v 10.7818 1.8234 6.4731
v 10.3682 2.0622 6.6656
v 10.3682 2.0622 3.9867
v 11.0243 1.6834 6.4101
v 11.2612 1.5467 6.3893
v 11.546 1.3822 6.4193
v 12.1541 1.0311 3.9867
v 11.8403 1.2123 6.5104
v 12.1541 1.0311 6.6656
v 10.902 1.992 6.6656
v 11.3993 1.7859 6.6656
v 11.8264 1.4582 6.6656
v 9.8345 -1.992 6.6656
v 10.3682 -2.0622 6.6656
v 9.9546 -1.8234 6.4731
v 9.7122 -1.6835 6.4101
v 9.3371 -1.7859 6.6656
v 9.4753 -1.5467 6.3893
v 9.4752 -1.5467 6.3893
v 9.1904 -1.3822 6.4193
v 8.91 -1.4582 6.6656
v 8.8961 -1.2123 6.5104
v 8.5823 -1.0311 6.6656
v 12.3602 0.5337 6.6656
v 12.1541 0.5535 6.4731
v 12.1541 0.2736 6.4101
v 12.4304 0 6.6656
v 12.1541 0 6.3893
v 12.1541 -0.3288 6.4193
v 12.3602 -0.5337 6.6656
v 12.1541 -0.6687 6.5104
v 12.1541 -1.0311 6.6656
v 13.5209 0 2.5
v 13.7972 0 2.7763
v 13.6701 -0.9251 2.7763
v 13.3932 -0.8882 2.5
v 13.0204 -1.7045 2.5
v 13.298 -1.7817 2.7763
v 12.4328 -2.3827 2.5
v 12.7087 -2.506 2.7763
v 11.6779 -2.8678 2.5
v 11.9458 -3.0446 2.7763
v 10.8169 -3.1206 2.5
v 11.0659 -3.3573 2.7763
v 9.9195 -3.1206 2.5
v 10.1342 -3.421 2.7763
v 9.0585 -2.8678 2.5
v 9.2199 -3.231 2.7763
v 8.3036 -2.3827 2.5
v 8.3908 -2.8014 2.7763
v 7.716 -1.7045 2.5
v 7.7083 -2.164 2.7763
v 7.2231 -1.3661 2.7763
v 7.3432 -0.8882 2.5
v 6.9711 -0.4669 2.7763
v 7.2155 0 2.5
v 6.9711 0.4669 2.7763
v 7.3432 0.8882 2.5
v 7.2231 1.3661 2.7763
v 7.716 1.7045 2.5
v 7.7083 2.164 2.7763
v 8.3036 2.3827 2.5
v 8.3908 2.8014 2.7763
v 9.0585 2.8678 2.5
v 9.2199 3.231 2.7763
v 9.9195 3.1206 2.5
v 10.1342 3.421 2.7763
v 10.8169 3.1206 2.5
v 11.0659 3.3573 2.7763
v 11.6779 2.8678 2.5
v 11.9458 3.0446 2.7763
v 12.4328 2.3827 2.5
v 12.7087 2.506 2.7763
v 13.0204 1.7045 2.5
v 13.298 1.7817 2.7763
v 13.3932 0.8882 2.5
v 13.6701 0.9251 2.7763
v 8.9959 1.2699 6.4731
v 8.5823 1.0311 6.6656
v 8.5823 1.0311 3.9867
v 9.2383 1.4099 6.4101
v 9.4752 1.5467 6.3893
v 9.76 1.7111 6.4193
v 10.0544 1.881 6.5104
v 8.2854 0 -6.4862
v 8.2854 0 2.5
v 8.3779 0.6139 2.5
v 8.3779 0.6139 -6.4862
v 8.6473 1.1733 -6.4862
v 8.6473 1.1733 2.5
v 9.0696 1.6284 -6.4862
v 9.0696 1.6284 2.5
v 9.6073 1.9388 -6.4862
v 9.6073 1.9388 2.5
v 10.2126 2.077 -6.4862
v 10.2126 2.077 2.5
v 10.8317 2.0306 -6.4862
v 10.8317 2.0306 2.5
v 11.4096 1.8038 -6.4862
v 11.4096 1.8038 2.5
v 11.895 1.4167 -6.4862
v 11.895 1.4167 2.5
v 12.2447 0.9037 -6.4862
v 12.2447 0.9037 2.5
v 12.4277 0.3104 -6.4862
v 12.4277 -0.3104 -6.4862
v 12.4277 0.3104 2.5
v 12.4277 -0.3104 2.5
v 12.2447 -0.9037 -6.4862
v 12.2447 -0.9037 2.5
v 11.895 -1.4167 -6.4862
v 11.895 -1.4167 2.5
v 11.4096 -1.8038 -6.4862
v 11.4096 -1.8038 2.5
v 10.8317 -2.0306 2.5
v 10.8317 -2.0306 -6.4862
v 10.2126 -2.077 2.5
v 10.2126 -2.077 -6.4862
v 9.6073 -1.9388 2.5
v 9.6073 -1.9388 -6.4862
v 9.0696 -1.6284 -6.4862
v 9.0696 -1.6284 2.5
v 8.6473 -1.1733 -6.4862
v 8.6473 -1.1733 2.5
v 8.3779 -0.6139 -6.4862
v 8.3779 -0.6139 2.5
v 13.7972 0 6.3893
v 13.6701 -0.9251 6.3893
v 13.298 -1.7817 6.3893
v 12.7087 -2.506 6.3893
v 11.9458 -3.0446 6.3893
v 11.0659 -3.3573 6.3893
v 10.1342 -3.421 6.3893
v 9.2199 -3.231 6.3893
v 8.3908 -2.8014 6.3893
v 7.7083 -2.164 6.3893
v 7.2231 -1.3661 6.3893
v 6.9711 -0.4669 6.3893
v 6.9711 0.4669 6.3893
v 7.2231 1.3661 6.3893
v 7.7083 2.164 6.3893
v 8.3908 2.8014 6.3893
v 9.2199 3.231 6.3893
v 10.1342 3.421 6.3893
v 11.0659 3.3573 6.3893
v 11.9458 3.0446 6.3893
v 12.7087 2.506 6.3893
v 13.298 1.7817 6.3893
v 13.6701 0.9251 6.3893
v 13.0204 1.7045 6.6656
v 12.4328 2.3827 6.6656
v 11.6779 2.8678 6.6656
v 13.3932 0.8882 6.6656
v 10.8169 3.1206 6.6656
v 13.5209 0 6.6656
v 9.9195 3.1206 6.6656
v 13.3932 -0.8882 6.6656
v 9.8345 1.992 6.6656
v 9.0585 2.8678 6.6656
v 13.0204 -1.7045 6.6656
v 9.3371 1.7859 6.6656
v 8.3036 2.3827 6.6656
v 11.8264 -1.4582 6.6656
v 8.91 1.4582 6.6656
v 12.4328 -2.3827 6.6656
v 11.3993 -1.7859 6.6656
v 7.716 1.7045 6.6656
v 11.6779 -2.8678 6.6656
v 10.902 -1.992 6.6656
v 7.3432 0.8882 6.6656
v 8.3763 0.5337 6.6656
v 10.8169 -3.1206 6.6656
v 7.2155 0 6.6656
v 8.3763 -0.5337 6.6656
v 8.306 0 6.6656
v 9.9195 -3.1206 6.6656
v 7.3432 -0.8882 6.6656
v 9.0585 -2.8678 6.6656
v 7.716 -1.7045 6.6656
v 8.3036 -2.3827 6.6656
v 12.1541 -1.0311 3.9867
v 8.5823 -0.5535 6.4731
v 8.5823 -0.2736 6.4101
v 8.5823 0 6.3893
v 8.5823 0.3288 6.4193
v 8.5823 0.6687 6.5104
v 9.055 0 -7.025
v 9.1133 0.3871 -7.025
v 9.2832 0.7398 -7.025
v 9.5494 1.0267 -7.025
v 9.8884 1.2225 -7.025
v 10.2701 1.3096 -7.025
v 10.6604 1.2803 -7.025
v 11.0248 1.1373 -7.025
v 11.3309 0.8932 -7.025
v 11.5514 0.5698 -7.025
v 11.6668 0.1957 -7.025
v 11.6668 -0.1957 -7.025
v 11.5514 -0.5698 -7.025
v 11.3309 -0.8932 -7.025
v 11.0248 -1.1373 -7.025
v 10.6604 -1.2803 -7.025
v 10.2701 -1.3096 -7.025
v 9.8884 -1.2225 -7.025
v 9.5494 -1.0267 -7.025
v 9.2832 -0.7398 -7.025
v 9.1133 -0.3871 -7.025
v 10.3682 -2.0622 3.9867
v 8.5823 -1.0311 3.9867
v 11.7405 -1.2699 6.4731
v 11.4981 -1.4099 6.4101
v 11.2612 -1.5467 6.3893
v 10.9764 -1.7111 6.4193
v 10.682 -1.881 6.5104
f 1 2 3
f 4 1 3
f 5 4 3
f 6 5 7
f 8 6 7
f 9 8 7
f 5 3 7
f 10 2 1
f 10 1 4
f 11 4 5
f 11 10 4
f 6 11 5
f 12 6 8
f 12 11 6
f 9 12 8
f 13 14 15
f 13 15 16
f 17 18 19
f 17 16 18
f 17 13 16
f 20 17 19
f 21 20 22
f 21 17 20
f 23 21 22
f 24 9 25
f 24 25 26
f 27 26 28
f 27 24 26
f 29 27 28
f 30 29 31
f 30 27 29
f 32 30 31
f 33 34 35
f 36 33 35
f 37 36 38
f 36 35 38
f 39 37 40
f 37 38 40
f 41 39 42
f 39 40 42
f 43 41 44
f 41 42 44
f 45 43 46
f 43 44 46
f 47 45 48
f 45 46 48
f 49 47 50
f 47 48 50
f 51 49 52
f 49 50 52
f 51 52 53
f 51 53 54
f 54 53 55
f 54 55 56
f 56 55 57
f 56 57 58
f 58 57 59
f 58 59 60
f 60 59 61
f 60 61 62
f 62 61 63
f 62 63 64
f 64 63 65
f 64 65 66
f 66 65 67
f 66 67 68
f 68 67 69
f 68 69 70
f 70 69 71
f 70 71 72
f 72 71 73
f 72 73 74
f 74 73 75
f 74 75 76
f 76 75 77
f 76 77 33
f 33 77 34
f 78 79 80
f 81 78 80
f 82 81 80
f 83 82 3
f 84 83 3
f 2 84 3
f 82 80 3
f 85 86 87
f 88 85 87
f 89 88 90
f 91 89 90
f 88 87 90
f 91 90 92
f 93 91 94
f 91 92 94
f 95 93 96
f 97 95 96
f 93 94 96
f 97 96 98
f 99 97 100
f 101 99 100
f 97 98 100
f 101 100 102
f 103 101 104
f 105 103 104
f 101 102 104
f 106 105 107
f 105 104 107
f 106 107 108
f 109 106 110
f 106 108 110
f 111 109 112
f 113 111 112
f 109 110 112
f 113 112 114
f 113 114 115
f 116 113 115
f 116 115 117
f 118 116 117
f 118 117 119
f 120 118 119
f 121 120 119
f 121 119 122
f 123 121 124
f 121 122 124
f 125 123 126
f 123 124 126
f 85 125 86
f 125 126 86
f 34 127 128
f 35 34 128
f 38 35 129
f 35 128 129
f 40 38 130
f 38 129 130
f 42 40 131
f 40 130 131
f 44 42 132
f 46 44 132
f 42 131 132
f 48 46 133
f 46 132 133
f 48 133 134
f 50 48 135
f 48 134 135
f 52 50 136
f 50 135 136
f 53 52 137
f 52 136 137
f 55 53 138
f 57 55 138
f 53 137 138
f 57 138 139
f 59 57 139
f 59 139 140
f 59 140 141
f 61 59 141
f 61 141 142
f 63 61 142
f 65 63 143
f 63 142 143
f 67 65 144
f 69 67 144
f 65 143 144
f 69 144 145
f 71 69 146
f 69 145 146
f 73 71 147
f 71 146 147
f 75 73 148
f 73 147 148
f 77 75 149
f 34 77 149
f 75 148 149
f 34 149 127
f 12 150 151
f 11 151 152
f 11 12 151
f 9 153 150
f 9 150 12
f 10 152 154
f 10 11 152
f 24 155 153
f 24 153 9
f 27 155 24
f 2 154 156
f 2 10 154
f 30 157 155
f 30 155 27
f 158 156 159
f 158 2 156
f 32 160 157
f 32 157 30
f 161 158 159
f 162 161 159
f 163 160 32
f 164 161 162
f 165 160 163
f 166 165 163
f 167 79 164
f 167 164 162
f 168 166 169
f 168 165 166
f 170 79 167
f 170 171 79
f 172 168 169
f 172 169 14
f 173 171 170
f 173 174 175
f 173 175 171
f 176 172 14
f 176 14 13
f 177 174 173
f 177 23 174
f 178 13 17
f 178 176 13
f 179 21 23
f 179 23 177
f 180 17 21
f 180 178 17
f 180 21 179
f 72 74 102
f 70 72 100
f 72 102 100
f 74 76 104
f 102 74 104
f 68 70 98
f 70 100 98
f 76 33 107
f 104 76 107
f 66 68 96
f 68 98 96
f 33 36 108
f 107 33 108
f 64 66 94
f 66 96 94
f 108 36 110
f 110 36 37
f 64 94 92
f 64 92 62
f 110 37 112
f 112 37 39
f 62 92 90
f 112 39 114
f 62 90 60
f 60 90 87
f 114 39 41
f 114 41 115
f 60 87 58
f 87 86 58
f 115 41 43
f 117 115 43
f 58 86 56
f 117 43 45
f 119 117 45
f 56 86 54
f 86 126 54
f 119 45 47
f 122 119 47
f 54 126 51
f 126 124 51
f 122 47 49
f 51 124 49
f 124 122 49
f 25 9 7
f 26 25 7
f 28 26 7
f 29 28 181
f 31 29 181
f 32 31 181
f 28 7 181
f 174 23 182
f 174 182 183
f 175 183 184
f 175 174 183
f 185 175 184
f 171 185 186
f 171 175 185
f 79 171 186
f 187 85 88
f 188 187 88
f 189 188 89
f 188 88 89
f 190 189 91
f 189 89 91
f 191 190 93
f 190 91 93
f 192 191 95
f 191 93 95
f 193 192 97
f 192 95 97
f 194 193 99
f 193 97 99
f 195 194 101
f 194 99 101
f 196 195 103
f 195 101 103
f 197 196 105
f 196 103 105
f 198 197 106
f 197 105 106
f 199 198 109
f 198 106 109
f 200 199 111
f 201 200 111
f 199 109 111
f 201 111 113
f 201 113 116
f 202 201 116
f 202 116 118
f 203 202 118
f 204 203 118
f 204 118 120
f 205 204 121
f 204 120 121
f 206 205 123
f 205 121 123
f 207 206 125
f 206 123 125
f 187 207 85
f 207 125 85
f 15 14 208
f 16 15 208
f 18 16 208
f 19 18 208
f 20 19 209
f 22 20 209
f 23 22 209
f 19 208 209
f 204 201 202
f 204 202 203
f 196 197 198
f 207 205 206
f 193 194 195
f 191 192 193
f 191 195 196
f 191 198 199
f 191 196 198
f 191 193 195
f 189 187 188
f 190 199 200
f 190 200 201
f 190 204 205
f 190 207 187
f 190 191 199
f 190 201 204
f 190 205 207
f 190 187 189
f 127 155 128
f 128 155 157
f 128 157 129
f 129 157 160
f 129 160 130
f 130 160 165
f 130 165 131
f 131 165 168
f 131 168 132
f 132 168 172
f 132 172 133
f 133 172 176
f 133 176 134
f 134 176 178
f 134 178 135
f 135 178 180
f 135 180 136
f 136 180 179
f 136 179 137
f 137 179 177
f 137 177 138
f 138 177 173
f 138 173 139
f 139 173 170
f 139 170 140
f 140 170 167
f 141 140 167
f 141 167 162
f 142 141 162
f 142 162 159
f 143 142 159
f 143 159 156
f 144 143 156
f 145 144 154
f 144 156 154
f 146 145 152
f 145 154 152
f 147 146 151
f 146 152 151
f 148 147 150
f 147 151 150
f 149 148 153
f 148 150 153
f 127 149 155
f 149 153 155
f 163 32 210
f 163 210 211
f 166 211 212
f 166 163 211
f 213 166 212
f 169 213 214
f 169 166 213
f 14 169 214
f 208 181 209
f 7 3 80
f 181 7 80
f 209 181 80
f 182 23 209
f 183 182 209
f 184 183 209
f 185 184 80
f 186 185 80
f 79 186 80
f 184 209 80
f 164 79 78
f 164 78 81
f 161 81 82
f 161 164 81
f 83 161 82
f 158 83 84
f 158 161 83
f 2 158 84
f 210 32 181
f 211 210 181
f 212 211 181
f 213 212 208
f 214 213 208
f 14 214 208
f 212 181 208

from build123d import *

# Parameters (mm, degrees)
SKETCH1_W           = 3.429
SKETCH1_H           = 4.1656
SKETCH2_R           = 2.0828
BOSS_EXTRUDE1_DEPTH = 9.525
CUT_EXTRUDE1_DEPTH  = 2.678906
CHAMFER1_SIZE       = 0.27628549
CHAMFER2_SIZE       = 0.769555748
CHAMFER2_SIZE2      = 0.538848736


with BuildPart() as part:
    # Sketch1 → Revolve1 (revolve)
    with BuildSketch(Plane.XZ):
        with Locations((12.082710259, 4.5828)):
            Rectangle(SKETCH1_W, SKETCH1_H)
    revolve(axis=Axis((10.368210259, 0, 6.6656), (0, 0, -1)))

    # Sketch2 → Boss-Extrude1 (add)
    with BuildSketch(Plane(origin=(0, 0, 2.5), x_dir=(-1, 0, 0), z_dir=(0, 0, -1))):
        with Locations((-10.368210259, 0)):
            Circle(SKETCH2_R)
    extrude(amount=BOSS_EXTRUDE1_DEPTH)

    # Sketch3 → Cut-Extrude1 (cut)
    with BuildSketch(Plane(origin=(0, 0, 3.98669375), x_dir=(-1, 0, 0), z_dir=(0, 0, -1))):
        Polygon((-10.368210259, -2.062222993), (-8.582272759, -1.031111496), (-8.582272759, 1.031111496), (-10.368210259, 2.062222993), (-12.154147759, 1.031111496), (-12.154147759, -1.031111496), align=None)
    extrude(amount=-CUT_EXTRUDE1_DEPTH, mode=Mode.SUBTRACT)

    # Chamfer1
    chamfer1_edges = [part.edges().sort_by_distance(p)[0] for p in [
        (6.939210259, 0, 2.5),
        (6.939210259, 0, 6.6656),
    ]]
    chamfer(chamfer1_edges, length=CHAMFER1_SIZE)

    # Chamfer2
    chamfer2_edges = [part.edges().sort_by_distance(p)[0] for p in [
        (12.451010259, 0, -7.025),
    ]]
    chamfer2_side = [part.faces().sort_by_distance(p)[0] for p in [
        (10.368210259, 0, -7.025),
    ]]
    chamfer(chamfer2_edges, length=CHAMFER2_SIZE, length2=CHAMFER2_SIZE2, reference=chamfer2_side[0])

    # Sketch4 → Cut-Revolve1 (revolve, cut)
    with BuildSketch(Plane(origin=(0, 0, 0), x_dir=(1, 0, 0), z_dir=(0, 1, 0))):
        Polygon((8.582272759, -6.38931451), (8.305987269, -6.6656), (8.582272759, -6.6656), align=None)
    revolve(axis=Axis((10.368210259, 0, 6.799545312), (0, 0, -1)), mode=Mode.SUBTRACT)


solid = part.part
